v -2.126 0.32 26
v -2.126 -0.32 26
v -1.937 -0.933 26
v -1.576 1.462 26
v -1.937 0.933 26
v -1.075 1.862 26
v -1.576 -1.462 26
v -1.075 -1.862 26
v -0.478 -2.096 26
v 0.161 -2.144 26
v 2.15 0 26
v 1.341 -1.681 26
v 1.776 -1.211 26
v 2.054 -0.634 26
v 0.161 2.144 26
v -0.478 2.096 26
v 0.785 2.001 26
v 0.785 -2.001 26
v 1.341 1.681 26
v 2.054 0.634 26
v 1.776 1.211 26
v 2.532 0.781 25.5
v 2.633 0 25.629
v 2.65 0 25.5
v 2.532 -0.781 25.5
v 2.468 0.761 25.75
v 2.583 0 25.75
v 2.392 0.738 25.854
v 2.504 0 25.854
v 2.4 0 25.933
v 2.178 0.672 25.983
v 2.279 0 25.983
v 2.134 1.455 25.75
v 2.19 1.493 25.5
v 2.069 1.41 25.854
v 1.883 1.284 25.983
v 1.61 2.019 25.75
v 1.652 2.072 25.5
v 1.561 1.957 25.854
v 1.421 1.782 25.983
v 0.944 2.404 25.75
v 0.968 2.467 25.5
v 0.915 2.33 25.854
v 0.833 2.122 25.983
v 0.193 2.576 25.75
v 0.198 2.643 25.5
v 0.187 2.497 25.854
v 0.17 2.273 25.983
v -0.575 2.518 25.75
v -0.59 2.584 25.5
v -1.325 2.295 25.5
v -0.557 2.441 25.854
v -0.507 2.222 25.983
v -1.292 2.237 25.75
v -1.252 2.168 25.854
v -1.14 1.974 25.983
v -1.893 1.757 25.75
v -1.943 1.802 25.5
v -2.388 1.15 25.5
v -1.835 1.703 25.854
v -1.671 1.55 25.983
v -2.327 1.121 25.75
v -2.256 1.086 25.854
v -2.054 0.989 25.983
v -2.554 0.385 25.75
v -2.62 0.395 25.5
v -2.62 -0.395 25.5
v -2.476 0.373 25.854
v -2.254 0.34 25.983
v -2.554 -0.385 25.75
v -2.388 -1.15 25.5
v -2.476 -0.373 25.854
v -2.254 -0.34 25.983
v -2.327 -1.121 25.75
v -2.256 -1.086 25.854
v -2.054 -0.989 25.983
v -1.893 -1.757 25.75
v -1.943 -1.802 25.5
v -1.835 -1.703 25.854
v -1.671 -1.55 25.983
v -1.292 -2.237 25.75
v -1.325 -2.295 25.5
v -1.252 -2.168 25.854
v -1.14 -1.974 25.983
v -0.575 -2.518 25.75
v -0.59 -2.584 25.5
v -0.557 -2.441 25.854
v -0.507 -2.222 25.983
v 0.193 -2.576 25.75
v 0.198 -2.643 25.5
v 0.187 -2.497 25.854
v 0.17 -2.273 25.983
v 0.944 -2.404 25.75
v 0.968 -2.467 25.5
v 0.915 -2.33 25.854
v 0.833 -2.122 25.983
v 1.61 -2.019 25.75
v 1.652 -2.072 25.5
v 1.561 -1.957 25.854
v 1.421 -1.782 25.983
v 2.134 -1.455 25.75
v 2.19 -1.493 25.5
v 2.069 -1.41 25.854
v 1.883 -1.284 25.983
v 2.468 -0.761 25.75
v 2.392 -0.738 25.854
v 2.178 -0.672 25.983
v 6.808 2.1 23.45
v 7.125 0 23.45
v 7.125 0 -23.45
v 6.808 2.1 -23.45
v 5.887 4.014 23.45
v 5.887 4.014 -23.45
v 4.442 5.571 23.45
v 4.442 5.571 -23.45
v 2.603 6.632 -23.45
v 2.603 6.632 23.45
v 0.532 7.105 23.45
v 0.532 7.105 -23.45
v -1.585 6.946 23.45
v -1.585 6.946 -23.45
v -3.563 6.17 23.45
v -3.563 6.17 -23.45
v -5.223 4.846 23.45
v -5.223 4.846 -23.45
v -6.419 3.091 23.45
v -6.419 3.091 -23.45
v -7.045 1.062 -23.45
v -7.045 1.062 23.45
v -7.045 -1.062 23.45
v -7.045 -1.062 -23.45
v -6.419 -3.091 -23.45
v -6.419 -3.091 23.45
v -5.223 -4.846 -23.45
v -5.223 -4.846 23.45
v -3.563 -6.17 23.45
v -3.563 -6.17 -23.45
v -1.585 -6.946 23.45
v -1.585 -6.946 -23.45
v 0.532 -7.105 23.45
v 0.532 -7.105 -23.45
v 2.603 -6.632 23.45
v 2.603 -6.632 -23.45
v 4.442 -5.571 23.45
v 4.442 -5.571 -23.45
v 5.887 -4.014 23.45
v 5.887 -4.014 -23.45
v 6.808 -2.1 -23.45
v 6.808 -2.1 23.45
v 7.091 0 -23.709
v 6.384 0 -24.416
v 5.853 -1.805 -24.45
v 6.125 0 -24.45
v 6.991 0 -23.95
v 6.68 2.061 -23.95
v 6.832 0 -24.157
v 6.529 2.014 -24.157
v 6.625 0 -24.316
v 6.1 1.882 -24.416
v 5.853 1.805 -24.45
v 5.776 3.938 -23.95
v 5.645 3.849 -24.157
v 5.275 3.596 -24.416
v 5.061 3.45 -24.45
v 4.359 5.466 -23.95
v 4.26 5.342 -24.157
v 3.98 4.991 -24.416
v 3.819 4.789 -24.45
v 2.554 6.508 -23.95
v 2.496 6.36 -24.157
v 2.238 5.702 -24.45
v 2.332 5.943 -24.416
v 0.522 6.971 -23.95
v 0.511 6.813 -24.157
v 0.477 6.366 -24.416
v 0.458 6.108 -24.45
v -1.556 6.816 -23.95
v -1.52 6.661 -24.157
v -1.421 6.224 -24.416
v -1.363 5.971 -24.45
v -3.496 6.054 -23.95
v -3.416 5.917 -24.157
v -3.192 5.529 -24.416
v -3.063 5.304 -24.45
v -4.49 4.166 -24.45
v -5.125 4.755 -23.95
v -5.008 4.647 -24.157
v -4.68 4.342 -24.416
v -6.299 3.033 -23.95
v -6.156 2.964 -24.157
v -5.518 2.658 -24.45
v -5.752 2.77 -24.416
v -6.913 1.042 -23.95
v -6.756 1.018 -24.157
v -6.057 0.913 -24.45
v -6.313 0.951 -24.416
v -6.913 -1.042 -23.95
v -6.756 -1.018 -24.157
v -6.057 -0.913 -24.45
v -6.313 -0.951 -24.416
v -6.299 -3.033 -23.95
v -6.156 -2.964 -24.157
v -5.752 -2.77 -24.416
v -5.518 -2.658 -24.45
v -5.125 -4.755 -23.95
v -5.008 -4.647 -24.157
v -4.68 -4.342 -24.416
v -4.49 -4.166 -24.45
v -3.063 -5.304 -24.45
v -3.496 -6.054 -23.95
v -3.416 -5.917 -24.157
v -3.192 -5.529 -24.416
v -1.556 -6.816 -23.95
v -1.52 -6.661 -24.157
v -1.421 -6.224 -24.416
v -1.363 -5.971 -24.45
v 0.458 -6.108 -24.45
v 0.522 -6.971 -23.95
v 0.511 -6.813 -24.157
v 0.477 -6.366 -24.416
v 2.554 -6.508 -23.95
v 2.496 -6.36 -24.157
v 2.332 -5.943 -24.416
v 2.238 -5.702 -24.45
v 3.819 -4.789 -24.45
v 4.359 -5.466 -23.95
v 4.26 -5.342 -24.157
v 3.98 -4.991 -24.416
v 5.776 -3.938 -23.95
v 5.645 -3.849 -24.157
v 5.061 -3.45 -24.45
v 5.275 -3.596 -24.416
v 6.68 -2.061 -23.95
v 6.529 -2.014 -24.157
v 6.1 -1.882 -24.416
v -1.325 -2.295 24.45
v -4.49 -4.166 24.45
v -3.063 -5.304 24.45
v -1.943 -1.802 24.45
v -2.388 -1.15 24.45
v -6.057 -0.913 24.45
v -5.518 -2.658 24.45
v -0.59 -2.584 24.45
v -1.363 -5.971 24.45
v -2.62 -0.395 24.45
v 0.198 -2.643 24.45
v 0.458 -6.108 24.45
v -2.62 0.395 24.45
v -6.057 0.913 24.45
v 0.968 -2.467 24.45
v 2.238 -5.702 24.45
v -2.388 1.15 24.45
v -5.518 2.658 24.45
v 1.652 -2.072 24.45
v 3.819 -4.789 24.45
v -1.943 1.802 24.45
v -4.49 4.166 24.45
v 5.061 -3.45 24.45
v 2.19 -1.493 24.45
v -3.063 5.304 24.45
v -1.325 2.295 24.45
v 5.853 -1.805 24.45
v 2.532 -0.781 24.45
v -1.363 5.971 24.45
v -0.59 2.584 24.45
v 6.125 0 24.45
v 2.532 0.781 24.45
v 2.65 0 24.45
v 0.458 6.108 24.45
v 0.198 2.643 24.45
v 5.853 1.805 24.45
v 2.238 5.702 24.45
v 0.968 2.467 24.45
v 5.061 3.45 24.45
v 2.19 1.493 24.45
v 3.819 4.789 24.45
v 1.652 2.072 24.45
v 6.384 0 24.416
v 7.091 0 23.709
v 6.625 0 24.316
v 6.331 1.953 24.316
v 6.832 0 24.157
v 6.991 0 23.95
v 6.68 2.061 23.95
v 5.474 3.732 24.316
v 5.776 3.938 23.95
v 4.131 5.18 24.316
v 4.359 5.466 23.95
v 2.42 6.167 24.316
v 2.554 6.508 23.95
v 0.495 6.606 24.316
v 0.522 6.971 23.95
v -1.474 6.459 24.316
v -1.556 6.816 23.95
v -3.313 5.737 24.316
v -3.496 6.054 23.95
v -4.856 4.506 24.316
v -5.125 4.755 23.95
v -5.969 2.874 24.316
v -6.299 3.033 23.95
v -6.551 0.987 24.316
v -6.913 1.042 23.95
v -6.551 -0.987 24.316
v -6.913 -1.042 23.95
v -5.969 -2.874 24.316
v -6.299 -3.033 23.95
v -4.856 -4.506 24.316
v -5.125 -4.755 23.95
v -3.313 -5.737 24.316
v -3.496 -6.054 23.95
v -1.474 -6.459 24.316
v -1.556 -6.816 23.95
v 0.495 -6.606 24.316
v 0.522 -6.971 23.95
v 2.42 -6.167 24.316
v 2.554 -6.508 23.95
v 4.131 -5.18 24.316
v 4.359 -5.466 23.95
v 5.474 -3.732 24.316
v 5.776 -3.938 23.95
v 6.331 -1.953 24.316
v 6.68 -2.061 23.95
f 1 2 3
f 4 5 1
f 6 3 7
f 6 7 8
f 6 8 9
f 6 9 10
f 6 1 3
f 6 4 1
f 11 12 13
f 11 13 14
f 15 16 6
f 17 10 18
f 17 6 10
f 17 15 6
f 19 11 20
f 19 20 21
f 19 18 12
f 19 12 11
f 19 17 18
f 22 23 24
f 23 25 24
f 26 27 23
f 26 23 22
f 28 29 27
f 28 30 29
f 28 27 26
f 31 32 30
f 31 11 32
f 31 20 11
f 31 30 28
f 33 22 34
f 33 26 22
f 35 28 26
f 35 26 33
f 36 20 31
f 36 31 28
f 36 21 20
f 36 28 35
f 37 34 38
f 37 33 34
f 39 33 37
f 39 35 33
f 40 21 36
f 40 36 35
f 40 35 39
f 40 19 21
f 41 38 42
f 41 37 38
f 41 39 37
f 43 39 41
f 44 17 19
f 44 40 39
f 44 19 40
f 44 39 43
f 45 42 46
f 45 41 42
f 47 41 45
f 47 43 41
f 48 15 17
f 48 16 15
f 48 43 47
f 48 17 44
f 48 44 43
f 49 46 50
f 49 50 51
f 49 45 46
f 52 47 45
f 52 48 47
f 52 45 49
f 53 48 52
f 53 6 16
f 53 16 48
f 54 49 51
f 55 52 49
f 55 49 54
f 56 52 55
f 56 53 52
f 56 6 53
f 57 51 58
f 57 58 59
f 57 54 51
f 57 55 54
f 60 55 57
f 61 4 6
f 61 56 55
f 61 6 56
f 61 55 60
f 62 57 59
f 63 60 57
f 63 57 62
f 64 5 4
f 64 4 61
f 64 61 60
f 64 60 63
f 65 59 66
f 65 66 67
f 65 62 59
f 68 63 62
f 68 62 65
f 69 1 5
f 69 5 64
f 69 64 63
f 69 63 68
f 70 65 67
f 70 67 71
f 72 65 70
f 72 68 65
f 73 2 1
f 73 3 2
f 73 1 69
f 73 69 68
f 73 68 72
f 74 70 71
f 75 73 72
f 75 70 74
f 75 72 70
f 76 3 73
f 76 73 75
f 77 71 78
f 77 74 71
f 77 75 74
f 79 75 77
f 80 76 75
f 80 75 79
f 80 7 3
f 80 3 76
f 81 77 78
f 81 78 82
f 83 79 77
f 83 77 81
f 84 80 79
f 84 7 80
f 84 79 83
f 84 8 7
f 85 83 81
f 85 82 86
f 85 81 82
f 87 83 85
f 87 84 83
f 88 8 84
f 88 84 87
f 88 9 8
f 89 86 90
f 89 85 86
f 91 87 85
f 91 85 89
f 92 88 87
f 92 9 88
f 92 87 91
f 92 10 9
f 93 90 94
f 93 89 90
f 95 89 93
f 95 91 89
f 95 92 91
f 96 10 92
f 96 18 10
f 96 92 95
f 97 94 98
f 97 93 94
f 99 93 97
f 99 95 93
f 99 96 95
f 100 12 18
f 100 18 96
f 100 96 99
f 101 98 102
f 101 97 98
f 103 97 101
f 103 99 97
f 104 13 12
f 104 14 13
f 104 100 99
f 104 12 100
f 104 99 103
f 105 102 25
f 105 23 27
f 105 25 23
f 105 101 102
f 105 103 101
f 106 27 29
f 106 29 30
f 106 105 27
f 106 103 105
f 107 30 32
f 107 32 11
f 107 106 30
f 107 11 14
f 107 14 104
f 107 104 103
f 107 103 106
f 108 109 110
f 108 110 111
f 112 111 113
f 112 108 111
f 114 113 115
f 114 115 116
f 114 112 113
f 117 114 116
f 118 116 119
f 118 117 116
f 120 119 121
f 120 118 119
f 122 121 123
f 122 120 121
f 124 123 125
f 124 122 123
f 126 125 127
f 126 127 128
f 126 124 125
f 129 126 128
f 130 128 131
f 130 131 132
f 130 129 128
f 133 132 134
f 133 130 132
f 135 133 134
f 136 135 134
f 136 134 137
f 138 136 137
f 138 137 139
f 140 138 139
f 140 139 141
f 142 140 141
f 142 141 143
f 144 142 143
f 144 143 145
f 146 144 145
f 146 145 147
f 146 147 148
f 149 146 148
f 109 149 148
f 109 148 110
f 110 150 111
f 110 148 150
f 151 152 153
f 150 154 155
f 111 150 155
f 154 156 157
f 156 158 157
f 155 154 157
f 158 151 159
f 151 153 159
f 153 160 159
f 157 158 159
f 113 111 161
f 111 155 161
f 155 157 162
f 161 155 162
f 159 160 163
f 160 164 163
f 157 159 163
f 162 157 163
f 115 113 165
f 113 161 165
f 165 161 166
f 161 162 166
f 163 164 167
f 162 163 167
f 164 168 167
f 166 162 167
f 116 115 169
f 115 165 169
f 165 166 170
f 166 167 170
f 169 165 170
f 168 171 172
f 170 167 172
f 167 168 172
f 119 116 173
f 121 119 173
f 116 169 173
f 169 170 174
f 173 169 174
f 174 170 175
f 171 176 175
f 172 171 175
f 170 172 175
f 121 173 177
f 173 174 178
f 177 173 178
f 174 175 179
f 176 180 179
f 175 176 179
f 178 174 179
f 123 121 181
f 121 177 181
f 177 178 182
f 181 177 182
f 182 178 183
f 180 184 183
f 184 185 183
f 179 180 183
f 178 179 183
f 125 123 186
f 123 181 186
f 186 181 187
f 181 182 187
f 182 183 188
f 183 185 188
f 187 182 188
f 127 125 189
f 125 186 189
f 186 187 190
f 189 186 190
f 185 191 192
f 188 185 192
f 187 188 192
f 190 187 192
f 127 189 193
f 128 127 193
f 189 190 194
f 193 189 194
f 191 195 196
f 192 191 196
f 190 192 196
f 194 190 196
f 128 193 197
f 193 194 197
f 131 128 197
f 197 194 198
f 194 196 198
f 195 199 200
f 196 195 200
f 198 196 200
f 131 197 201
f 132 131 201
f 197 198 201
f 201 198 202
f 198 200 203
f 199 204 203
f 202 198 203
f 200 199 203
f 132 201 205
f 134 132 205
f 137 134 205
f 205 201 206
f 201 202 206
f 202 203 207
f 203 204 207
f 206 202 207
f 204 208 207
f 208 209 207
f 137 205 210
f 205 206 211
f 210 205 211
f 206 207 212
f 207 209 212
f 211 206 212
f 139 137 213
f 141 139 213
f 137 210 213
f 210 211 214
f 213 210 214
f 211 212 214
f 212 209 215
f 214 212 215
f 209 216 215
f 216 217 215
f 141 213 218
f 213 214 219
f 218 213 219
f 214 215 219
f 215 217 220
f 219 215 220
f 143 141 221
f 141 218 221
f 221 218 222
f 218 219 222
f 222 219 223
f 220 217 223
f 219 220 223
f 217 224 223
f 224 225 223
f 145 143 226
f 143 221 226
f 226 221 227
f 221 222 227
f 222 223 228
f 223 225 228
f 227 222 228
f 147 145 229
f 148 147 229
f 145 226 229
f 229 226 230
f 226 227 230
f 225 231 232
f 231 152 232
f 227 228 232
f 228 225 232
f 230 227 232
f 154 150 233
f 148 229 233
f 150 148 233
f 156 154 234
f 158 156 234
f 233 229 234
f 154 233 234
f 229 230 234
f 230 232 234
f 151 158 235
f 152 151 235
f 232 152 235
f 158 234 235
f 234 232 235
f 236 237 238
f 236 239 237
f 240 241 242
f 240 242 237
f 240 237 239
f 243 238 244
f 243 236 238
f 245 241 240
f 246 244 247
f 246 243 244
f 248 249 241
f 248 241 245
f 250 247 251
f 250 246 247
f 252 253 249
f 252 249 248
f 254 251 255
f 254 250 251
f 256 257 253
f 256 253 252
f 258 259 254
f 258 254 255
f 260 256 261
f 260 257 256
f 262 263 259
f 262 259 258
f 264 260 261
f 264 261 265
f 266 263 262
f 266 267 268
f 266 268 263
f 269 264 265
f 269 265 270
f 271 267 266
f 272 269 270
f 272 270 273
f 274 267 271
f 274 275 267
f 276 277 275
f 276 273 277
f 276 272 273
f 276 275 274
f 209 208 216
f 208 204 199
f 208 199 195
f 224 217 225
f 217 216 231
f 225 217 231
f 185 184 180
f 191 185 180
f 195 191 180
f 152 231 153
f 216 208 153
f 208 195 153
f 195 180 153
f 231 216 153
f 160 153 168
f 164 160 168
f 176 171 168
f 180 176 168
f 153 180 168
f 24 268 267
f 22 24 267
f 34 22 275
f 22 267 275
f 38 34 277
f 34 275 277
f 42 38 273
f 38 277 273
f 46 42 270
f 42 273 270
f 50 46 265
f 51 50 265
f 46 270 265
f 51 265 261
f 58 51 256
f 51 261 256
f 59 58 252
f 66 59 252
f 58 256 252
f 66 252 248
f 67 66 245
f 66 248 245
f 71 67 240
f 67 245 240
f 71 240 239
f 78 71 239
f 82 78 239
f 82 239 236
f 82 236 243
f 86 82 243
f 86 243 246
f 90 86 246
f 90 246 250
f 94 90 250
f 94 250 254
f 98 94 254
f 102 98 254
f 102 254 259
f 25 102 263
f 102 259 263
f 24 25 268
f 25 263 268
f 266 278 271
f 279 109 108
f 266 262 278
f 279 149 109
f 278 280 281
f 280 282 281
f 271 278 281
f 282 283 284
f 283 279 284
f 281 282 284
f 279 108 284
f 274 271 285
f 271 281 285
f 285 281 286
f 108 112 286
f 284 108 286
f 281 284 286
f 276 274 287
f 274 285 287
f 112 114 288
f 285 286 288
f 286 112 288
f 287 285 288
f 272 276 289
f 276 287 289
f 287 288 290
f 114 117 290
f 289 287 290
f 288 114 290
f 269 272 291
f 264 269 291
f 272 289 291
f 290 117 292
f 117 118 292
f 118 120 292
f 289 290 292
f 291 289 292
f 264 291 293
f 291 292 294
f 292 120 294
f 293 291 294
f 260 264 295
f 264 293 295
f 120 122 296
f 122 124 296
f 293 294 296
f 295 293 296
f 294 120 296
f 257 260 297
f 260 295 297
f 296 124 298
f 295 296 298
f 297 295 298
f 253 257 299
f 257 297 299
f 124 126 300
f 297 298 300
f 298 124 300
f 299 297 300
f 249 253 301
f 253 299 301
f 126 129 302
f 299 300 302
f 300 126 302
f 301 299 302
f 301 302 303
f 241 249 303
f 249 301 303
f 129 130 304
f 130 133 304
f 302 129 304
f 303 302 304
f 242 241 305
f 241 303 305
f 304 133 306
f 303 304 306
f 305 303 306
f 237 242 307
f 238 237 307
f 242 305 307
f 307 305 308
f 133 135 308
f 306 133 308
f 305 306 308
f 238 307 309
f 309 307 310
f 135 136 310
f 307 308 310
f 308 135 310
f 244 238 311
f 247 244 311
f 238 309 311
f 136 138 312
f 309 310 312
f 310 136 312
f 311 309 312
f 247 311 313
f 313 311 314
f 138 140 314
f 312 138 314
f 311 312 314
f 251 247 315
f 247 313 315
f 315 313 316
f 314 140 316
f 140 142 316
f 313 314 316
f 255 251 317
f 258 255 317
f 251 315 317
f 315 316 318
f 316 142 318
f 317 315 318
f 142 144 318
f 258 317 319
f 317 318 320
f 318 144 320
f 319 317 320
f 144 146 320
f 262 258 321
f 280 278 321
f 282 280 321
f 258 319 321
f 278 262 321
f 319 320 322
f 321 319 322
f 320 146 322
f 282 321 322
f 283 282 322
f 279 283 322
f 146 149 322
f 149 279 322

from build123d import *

# Parameters (mm, degrees)
F0_R     = 7.125
F1_DEPTH = 24.45
F2_R     = 2.65
F3_DEPTH = 1.55
F4_R     = 0.5
F5_R     = 1


with BuildPart() as f1:
    # F0 (on Top) → F1 (new body, symmetric)
    with BuildSketch(Plane.XY):
        Circle(F0_R)
    extrude(amount=F1_DEPTH, both=True)

    # F2 (on face) → F3 (join)
    with BuildSketch(Plane.XY.offset(24.45)):
        Circle(F2_R)
    extrude(amount=F3_DEPTH)

    # F4
    f4_edges = [f1.edges().sort_by_distance(p)[0] for p in [
        (-2.65, 0, 26),
    ]]
    fillet(f4_edges, radius=F4_R)

    # F5
    f5_edges = [f1.edges().sort_by_distance(p)[0] for p in [
        (-7.125, 0, 24.45),
        (-7.125, 0, -24.45),
    ]]
    fillet(f5_edges, radius=F5_R)


solid = f1.part
